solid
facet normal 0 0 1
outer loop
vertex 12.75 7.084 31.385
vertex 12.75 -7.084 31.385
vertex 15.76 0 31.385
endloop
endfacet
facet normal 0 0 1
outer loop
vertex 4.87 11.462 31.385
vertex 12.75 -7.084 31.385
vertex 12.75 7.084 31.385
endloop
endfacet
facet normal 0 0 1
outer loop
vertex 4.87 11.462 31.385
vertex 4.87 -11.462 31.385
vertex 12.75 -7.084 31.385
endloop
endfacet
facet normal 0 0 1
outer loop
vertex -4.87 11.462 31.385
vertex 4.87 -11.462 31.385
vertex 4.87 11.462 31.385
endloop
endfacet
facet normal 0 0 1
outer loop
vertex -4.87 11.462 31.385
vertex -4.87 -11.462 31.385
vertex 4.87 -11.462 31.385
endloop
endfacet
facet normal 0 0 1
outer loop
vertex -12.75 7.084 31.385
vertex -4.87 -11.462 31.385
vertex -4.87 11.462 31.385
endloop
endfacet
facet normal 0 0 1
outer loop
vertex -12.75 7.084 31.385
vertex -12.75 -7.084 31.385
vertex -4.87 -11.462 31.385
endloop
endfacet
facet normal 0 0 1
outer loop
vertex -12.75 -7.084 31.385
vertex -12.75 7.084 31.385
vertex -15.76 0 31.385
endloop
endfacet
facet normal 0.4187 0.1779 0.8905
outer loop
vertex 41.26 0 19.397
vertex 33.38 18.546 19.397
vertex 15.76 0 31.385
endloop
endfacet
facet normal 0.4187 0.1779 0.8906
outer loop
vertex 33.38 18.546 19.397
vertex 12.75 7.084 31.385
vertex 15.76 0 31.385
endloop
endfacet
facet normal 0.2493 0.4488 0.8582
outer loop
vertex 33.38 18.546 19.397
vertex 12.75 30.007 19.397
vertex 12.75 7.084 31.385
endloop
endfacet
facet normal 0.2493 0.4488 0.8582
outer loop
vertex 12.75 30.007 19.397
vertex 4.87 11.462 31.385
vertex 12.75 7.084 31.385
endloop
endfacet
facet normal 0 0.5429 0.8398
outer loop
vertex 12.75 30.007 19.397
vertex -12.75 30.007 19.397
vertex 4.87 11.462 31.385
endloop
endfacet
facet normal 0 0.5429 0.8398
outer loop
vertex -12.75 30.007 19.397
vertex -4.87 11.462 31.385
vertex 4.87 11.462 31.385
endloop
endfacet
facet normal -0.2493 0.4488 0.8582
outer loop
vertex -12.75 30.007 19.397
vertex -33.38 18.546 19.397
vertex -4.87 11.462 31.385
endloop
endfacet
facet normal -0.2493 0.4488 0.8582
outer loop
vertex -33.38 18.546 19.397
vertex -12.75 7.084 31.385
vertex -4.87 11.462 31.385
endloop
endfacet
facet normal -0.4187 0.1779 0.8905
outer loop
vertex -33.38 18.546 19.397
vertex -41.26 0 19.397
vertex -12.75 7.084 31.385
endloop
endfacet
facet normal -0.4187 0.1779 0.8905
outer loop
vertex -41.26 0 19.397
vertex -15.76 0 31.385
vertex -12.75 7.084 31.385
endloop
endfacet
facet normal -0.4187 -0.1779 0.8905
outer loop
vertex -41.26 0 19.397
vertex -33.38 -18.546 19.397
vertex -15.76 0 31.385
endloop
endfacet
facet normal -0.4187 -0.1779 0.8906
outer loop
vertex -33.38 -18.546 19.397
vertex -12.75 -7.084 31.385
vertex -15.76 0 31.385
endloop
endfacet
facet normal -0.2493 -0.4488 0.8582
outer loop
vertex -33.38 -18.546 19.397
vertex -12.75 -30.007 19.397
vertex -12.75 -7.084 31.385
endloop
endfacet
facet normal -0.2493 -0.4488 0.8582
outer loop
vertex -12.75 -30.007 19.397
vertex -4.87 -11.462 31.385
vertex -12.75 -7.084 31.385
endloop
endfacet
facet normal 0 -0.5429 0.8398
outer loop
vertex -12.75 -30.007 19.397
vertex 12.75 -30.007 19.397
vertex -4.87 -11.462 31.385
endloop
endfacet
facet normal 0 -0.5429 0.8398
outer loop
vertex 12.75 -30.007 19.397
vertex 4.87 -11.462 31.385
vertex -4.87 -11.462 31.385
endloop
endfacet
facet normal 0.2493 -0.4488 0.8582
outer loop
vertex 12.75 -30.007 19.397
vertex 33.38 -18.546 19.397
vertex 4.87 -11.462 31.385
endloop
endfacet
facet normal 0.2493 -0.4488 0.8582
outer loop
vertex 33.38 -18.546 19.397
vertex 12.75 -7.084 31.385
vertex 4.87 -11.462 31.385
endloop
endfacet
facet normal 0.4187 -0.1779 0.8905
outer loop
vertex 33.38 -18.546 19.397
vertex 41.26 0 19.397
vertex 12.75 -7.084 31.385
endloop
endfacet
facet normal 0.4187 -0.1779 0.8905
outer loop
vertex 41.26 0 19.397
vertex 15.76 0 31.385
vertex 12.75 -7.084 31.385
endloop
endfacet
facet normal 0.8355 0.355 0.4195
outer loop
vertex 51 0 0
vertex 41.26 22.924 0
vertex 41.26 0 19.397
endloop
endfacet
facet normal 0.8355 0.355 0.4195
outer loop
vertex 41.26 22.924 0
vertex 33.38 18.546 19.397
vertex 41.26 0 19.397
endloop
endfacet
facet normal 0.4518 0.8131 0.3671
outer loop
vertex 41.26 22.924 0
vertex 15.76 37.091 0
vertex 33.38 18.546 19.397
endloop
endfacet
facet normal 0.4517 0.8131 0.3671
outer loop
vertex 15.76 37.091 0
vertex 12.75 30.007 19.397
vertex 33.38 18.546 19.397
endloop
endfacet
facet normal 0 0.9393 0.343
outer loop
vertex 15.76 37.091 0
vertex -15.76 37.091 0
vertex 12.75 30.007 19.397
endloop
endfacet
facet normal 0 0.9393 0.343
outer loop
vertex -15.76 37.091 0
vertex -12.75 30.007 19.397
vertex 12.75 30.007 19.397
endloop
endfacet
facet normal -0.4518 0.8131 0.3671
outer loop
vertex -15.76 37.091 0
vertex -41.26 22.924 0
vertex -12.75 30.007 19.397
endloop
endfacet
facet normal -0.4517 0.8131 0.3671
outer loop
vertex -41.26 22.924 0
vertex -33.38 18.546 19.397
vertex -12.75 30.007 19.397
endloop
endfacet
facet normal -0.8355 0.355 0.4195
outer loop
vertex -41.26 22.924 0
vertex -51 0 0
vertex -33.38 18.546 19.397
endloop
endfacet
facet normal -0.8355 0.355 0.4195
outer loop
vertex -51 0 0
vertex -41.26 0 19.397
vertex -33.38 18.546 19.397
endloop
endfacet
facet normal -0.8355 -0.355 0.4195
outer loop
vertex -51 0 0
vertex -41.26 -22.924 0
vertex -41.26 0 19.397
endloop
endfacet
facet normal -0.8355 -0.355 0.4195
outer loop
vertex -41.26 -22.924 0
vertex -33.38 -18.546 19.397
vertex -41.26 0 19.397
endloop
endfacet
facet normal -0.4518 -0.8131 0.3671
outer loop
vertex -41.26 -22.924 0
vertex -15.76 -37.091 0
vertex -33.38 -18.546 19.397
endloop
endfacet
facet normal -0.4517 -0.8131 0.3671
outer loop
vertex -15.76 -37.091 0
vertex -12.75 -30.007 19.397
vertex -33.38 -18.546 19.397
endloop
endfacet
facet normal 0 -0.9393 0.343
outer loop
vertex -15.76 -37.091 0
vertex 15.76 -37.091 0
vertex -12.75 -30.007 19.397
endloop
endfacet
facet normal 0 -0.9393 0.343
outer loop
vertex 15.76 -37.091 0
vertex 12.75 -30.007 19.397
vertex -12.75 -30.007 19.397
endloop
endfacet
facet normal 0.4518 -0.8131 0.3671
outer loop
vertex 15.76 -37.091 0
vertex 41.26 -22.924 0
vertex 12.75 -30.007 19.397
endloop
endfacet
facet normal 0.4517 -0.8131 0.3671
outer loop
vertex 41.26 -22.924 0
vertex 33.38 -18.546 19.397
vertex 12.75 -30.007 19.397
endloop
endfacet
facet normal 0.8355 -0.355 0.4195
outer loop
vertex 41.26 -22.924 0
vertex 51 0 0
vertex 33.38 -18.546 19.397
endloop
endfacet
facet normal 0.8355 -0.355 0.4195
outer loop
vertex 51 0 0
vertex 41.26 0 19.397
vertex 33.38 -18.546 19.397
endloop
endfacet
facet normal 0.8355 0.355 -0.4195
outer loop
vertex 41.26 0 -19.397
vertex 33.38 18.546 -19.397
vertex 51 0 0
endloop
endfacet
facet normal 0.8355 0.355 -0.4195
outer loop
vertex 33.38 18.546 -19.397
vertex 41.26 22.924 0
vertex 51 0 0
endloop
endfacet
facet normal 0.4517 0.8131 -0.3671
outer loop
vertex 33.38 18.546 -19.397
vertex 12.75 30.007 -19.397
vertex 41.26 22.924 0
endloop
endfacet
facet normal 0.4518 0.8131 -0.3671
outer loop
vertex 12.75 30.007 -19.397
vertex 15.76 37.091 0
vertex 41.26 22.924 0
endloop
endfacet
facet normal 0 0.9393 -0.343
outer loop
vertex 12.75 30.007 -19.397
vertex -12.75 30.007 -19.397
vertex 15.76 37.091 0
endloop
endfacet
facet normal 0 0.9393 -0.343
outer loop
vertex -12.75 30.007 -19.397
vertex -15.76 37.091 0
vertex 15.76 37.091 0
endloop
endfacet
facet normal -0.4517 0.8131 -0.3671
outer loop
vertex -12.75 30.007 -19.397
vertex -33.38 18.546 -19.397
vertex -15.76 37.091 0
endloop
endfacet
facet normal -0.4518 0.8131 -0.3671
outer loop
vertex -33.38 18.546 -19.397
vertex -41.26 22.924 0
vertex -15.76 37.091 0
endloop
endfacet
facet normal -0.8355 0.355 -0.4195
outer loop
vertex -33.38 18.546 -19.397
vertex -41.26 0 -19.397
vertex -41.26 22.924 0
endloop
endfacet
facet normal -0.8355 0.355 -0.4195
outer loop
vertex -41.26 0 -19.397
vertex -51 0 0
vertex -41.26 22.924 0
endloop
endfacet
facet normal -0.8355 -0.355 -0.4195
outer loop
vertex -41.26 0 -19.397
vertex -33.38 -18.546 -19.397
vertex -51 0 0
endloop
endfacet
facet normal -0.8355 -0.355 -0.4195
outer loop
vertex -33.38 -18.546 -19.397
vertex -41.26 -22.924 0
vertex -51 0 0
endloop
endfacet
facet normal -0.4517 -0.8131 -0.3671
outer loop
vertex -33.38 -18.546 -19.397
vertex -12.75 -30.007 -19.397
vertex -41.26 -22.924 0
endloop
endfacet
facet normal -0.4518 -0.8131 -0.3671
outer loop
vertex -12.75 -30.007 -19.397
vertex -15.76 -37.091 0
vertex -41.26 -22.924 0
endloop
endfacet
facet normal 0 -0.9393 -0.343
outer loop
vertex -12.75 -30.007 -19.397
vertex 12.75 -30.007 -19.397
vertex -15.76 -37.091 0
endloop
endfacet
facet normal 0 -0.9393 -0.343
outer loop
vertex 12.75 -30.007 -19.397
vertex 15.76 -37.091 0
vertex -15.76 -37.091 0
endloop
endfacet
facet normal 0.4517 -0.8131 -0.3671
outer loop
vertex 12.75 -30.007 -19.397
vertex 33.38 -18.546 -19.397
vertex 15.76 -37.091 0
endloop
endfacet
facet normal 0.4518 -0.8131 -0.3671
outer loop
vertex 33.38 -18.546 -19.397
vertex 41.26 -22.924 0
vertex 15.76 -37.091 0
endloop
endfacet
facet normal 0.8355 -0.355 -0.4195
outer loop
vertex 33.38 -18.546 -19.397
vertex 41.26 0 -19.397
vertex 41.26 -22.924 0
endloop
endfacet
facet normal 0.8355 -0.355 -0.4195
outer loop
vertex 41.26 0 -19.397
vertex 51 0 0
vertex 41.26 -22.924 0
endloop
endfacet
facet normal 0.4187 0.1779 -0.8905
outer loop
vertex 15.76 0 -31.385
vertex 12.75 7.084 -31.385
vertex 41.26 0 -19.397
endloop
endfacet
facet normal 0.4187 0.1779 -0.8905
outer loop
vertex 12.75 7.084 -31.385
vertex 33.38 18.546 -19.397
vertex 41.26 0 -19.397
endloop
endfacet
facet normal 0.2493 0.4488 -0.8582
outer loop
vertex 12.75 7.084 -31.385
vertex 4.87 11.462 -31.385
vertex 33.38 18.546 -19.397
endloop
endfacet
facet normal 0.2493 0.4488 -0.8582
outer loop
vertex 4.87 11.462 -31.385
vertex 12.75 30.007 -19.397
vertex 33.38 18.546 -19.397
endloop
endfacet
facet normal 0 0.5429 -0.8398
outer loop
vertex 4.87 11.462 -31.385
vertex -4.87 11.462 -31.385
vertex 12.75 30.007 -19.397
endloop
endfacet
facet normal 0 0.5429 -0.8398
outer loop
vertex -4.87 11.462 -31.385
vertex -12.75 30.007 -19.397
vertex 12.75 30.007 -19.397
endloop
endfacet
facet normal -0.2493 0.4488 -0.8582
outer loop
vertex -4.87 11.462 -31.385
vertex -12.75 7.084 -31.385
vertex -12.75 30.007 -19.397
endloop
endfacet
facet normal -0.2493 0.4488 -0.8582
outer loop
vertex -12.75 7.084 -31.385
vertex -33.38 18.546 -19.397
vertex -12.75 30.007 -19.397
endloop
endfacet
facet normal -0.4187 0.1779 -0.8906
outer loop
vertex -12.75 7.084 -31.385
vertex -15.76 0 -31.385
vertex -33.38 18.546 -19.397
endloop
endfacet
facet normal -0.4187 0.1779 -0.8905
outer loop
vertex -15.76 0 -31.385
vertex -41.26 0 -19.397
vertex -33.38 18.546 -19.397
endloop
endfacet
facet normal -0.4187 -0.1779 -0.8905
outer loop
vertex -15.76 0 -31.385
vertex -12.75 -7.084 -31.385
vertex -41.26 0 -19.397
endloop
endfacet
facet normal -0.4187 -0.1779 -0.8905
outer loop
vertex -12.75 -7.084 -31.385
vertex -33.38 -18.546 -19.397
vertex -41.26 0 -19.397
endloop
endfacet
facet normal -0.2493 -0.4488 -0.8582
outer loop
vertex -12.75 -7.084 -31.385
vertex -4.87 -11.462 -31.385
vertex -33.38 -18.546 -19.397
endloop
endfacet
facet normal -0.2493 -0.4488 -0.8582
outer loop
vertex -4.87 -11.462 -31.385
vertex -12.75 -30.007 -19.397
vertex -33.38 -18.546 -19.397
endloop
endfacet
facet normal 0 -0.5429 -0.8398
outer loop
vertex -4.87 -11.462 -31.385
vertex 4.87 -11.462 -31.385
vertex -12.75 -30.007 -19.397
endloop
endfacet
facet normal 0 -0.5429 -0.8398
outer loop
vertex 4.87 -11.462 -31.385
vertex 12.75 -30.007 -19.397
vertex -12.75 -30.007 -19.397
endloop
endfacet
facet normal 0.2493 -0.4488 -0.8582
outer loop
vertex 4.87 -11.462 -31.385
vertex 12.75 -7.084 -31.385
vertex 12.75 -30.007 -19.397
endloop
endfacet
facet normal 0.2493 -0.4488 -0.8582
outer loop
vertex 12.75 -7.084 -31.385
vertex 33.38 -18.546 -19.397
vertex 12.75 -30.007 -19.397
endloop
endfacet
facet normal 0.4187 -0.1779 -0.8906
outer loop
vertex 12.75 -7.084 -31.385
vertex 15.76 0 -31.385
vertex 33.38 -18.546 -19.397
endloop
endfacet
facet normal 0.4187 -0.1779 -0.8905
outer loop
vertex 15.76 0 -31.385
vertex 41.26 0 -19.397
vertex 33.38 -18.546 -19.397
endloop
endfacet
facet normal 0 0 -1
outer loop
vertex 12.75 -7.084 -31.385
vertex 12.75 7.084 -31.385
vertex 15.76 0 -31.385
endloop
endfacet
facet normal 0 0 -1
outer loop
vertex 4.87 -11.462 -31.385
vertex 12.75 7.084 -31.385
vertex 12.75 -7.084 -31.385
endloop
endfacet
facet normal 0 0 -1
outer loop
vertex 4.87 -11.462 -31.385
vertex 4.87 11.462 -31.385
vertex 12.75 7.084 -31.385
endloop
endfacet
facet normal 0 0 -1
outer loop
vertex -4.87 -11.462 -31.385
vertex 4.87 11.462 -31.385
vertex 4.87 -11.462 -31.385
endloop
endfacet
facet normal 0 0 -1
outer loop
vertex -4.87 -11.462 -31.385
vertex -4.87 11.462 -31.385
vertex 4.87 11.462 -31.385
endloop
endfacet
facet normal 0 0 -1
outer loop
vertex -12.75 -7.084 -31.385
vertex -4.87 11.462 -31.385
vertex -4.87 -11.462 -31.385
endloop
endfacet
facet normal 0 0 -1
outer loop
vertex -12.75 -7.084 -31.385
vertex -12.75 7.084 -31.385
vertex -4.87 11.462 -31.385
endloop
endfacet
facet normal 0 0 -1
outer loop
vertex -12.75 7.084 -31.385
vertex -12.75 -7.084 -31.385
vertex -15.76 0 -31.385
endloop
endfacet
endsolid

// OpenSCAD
// Generated by SolidPython 1.0.1 on 2020-07-29 00:46:53


scale(v = [17, 13, 11]) {
	sphere(r = 3);
}
/***********************************************
*********      SolidPython code:      **********
************************************************
 
# import packages: SolidPython
from solid import *
from solid.utils import *
from itertools import chain, combinations, permutations


class Resize:

    def __init__(self, scad_file):
        self.scad_file = scad_file
        #self.scad_file = import_scad(scad_file)
        # cone/cylinder param:
        self.r1 = 0
        self.r2 = 0
        self.h = 0
        # rectangular prism param:
        self.w = 0
        self.l = 0
        # ellipse param:
        self.r = 0

    # import OpenScad code (file name corresponds to shape)


    # classify shape + parameters
    def assign(self, param1, param2, param3):
        if self.scad_file == 'cone.scad':
            self.r1 = param1
            self.r2 = param2
            self.h = param3
        elif self.scad_file == 'cylinder.scad':
            self.r1 = param1
            self.r2 = param2
            self.h = param3
        elif self.scad_file == 'rectangularPrism.scad':
            self.h = param1
            self.l = param2
            self.w = param3
        else:
            self.r = param1
            self.h = param2

    # resize parameters
    def iterate(self):
        x = range(3, 20, 2)
        i = 1
        if self.scad_file == 'cone.scad':
            tempList = list(permutations(x, 2))
            for temp in tempList:
                param1 = temp[0]
                param2 = temp[1]
                filepath = 'produced_scad_files/' + 'cone' + str(param1) + '_' + str(param2) + '_' + '.scad'
                scad_render_to_file(cylinder(h=param1, r1=param2, r2=0), filepath)

        elif self.scad_file == 'cylinder.scad':
            tempList = list(permutations(x, 3))
            for temp in tempList:
                param1 = temp[0]
                param2 = temp[1]
                filepath = 'produced_scad_files/' + 'cylinder' + str(param1) + '_' + str(param2) + '_' + '.scad'
                scad_render_to_file(cylinder(h=param1, r1=param2, r2=param2), filepath)

        elif self.scad_file == 'rectangularPrism.scad':
            tempList = list(permutations(x, 3))
            for temp in tempList:
                param1 = temp[0]
                param2 = temp[1]
                param3 = temp[2]
                filepath = 'produced_scad_files/' + 'rectangularPrism' + str(param1) + '_' + str(param2) + '_' + str(
                    param3) + '.scad'
                scad_render_to_file(cube(size=(param1, param2, param3)), filepath)

        elif self.scad_file == 'ellipse.scad':
            tempList = list(permutations(x, 4))
            for temp in tempList:
                param1 = temp[0]
                param2 = temp[1]
                param3 = temp[2]
                param4 = temp[3]
                filepath = 'produced_scad_files/' + 'ellipse' + str(param1) + '_' + str(param2) + '_' + str(param3) + '_' + str(param4) + '.scad'
                scad_render_to_file(scale([param1, param2, param3])(sphere(r=param4)), filepath)

    def render_to_scadfile(self):
        scad_render_to_file(scad, 'example.scad') 
 
************************************************/
